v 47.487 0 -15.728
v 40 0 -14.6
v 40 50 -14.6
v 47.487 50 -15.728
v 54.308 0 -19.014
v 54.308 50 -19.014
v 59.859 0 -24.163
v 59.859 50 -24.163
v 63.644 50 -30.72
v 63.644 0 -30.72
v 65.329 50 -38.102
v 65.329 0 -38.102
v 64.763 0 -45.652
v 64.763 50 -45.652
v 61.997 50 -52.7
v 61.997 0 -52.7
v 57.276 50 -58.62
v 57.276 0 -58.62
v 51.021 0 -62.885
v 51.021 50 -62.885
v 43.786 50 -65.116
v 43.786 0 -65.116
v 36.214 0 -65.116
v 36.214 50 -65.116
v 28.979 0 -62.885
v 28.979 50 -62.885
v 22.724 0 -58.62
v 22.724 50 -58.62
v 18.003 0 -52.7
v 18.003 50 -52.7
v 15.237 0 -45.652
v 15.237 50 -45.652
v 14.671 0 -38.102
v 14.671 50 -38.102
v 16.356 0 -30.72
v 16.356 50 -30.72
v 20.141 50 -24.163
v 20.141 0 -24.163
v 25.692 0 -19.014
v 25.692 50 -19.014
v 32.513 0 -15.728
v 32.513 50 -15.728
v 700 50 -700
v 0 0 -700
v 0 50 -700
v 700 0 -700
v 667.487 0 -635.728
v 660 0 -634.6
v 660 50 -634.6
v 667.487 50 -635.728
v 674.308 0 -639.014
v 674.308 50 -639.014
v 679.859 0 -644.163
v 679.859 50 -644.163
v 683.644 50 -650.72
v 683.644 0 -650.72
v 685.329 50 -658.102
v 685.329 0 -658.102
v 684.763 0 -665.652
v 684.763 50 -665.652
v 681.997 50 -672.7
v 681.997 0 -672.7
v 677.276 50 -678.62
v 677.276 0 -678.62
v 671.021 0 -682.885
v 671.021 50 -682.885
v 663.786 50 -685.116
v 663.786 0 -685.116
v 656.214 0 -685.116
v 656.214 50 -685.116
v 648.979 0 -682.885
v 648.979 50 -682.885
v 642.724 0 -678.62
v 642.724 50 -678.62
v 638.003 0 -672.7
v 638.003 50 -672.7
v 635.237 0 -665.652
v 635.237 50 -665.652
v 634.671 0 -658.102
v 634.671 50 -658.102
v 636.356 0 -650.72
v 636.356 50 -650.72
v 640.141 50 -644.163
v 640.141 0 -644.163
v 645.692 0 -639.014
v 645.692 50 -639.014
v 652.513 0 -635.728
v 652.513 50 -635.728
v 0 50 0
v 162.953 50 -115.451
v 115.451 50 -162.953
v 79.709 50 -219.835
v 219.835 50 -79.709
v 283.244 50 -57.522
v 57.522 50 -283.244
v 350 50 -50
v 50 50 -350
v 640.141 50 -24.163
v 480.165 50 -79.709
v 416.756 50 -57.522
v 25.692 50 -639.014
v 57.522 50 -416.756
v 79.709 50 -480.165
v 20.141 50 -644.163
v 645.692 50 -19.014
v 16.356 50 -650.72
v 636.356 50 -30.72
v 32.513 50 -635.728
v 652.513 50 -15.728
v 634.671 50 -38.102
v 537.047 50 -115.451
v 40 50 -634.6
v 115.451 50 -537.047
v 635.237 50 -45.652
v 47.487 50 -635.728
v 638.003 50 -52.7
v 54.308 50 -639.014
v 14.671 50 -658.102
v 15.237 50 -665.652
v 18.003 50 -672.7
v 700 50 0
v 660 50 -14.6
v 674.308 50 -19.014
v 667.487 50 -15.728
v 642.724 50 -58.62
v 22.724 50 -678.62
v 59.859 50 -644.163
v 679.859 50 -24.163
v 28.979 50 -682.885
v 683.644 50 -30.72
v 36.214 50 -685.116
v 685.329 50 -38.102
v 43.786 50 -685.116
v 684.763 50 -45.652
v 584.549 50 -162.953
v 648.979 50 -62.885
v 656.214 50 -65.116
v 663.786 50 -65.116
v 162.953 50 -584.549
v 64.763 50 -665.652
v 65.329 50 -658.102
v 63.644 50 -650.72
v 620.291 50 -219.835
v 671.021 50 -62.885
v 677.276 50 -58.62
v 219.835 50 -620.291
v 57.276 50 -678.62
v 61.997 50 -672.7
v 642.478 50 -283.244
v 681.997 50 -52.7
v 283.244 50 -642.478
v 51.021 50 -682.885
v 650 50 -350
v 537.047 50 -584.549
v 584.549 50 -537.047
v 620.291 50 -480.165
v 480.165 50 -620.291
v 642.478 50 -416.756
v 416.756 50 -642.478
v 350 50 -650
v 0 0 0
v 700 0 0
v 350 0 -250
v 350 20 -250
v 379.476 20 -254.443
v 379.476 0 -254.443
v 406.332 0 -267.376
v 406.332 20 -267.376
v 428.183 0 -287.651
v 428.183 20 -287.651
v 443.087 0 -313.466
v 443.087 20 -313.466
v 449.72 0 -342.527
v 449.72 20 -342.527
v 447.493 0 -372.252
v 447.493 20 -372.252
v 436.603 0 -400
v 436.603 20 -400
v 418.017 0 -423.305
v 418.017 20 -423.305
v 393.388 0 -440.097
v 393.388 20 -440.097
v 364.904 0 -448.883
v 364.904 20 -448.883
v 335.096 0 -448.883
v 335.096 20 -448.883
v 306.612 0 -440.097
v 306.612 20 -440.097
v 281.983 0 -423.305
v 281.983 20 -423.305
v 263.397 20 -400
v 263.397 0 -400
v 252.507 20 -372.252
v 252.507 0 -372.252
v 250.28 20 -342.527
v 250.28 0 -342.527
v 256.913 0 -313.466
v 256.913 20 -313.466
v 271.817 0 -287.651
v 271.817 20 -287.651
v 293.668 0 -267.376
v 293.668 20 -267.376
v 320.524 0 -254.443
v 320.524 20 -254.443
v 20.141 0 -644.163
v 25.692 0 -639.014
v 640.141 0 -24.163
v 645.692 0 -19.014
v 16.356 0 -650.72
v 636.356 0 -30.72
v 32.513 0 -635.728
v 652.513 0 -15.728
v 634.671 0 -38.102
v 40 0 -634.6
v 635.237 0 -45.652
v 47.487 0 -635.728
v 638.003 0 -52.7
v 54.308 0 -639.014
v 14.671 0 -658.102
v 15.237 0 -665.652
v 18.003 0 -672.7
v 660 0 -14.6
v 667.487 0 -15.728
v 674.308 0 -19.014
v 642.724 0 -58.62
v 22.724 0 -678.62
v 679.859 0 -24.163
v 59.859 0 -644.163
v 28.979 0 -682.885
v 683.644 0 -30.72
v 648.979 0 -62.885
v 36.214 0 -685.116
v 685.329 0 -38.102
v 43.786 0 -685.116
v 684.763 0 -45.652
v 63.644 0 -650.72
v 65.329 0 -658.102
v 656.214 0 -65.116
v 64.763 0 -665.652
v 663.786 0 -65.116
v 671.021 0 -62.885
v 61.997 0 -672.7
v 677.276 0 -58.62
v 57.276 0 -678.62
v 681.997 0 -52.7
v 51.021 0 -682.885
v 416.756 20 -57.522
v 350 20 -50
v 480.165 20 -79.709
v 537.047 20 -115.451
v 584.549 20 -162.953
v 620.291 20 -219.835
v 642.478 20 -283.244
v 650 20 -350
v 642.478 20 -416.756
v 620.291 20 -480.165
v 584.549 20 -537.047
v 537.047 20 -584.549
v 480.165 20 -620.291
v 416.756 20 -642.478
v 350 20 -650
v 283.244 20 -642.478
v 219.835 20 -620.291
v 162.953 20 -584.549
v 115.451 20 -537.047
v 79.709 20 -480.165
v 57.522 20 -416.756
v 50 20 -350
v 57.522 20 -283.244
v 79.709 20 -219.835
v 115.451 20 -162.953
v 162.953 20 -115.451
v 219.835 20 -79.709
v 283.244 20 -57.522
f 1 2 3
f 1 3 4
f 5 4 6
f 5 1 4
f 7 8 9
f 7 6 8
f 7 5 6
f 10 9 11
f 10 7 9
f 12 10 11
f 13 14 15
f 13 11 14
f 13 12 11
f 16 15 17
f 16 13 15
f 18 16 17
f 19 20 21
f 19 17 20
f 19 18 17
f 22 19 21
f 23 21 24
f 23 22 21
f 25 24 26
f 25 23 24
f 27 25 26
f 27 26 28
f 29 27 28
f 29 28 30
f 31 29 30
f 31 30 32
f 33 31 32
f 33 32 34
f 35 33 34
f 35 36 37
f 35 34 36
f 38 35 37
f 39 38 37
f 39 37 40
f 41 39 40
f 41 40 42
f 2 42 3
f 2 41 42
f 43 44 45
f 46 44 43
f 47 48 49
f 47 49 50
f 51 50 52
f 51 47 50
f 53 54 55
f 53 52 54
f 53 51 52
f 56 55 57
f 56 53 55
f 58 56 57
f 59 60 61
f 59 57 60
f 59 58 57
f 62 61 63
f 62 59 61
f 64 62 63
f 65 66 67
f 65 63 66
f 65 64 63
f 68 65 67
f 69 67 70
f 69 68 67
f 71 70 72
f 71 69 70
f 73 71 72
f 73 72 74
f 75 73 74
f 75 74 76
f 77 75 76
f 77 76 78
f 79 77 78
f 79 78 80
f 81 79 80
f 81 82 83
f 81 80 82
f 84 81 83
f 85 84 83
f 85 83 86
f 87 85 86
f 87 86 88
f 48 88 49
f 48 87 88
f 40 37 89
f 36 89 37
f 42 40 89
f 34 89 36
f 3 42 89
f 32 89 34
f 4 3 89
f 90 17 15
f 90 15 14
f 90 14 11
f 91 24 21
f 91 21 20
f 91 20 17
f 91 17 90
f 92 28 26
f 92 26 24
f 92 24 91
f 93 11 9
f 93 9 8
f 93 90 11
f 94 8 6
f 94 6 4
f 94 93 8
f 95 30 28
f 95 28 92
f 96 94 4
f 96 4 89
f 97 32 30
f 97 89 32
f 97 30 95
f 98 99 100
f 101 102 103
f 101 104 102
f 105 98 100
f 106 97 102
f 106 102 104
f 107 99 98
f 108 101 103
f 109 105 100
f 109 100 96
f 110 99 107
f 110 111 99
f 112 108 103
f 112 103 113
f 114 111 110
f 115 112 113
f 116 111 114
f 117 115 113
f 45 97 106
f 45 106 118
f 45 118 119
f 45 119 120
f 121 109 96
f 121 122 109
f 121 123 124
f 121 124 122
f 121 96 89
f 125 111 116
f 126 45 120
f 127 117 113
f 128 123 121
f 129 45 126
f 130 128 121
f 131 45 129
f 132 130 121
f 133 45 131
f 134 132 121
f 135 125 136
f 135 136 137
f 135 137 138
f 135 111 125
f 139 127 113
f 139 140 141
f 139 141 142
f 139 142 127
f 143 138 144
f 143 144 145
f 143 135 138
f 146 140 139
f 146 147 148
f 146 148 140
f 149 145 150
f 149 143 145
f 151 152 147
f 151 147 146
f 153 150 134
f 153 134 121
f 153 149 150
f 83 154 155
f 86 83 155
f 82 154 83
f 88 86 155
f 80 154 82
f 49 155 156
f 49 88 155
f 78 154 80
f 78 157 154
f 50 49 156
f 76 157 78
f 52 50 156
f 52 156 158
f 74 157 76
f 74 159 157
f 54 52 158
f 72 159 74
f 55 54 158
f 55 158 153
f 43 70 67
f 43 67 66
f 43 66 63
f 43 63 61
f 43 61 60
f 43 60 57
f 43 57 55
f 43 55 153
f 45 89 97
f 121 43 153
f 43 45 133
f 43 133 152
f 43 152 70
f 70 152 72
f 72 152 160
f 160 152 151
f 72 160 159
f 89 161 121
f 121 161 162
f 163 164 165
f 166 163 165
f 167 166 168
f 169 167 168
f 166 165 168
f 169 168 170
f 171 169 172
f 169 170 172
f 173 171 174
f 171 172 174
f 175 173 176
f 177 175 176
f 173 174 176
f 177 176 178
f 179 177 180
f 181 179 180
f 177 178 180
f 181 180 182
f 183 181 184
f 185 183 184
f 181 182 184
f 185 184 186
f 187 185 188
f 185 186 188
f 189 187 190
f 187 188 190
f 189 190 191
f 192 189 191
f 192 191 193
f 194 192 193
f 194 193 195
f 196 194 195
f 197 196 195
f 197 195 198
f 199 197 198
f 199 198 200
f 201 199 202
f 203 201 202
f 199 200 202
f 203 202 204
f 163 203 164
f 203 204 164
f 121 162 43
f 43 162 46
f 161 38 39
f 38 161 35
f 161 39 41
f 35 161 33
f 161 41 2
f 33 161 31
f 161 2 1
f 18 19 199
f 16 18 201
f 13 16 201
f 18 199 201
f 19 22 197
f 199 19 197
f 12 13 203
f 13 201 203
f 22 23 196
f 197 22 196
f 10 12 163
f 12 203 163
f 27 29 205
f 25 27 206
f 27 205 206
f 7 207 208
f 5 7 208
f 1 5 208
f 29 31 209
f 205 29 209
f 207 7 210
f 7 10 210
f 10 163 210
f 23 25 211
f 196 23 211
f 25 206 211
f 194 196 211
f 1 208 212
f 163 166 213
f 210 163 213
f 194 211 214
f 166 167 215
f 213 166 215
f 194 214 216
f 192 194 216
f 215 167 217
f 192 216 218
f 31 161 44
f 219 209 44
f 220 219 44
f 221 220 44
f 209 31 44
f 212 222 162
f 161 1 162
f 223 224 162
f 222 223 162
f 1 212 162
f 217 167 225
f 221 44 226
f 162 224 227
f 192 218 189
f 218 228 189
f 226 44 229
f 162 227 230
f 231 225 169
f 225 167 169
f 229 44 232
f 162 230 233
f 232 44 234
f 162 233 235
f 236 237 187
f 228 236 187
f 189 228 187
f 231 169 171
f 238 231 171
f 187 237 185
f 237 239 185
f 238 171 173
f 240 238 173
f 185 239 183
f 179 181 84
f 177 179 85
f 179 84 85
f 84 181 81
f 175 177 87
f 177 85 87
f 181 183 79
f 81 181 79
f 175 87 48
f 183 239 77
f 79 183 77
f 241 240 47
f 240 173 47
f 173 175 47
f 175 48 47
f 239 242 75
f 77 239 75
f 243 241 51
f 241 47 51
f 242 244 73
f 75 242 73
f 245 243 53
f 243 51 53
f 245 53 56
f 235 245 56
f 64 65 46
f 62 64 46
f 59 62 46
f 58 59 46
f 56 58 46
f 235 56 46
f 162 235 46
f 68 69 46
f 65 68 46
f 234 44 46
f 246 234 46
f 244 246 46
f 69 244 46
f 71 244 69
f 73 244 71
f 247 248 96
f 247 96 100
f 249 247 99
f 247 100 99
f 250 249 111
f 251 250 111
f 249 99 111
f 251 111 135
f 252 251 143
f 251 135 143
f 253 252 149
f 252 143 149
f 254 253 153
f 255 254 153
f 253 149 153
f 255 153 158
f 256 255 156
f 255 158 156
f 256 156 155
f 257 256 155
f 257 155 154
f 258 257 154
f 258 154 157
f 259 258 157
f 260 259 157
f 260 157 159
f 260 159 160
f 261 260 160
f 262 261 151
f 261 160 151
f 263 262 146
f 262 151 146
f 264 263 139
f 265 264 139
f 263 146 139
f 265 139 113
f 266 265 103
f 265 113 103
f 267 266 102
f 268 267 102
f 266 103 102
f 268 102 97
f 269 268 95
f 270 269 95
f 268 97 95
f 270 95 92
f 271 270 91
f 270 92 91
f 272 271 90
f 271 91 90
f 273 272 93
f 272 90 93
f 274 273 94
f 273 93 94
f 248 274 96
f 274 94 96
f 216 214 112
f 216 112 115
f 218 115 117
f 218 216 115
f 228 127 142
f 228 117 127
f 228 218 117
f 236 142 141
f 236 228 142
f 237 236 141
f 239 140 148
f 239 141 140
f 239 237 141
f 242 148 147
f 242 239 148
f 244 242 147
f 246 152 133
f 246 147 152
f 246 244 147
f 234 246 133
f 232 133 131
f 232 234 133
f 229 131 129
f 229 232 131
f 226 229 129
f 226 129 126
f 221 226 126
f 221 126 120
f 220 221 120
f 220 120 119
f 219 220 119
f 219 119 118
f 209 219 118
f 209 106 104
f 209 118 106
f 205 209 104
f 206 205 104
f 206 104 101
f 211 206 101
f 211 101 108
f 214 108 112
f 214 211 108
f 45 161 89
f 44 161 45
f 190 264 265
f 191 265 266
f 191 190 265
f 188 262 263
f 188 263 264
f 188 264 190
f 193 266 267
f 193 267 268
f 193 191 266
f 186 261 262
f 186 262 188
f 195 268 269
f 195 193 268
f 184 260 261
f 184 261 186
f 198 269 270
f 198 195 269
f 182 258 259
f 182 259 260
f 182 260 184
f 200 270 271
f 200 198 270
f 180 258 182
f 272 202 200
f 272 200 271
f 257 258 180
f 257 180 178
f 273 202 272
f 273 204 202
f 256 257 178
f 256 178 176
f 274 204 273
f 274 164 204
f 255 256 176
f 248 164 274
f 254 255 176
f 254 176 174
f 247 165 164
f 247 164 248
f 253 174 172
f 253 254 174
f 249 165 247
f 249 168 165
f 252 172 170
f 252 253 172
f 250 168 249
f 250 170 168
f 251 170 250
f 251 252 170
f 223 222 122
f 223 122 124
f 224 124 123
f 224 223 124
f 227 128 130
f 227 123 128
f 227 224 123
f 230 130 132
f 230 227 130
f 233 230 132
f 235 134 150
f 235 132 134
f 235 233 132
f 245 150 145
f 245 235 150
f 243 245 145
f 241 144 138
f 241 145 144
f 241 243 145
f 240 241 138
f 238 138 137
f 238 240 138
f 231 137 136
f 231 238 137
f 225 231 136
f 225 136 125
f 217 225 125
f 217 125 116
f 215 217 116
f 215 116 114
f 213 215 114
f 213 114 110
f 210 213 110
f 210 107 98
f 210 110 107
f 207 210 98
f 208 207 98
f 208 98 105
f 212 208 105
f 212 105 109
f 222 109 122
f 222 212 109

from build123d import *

# Parameters (mm, degrees)
CROQUIS2_W                 = 700
CROQUIS2_H                 = 700
SALIENTE_EXTRUIR1_DEPTH    = 50
CORTAR_EXTRUIR1_DEPTH      = 992.21138008
CORTAR_EXTRUIR1_DEPTH_BACK = 992.21138008
CROQUIS3_R                 = 25.4
CROQUIS4_R                 = 300
CORTAR_EXTRUIR4_DEPTH      = 30
CROQUIS5_R                 = 100
CORTAR_EXTRUIR5_DEPTH      = 20


with BuildPart() as part:
    # Croquis2 → Saliente-Extruir1 (new body)
    with BuildSketch(Plane(origin=(0, 0, 0), x_dir=(1, 0, 0), z_dir=(0, 1, 0))):
        with Locations((350, 350)):
            Rectangle(CROQUIS2_W, CROQUIS2_H)
    extrude(amount=SALIENTE_EXTRUIR1_DEPTH)

    # Croquis3 → Cortar-Extruir1 (cut, two sides: drawn at the far end of the back side and taken through both)
    with BuildSketch(Plane(origin=(0, 50, 0), x_dir=(1, 0, 0), z_dir=(0, 1, 0)).offset(-CORTAR_EXTRUIR1_DEPTH_BACK)):
        with Locations(Location((40, 40, 0), (0, 0, 270))):
            Circle(CROQUIS3_R)
        with Locations(Location((660, 40, 0), (0, 0, 270))):
            Circle(CROQUIS3_R)
        with Locations(Location((660, 660, 0), (0, 0, 270))):
            Circle(CROQUIS3_R)
        with Locations(Location((40, 660, 0), (0, 0, 270))):
            Circle(CROQUIS3_R)
    extrude(amount=CORTAR_EXTRUIR1_DEPTH + CORTAR_EXTRUIR1_DEPTH_BACK, mode=Mode.SUBTRACT)

    # Croquis4 → Cortar-Extruir4 (cut)
    with BuildSketch(Plane(origin=(0, 50, 0), x_dir=(1, 0, 0), z_dir=(0, 1, 0))):
        with Locations(Location((350, 350, 0), (0, 0, 270))):
            Circle(CROQUIS4_R)
    extrude(amount=-CORTAR_EXTRUIR4_DEPTH, mode=Mode.SUBTRACT)

    # Croquis5 → Cortar-Extruir5 (cut)
    with BuildSketch(Plane(origin=(0, 20, 0), x_dir=(1, 0, 0), z_dir=(0, 1, 0))):
        with Locations(Location((350, 350, 0), (0, 0, 270))):
            Circle(CROQUIS5_R)
    extrude(amount=-CORTAR_EXTRUIR5_DEPTH, mode=Mode.SUBTRACT)


solid = part.part
